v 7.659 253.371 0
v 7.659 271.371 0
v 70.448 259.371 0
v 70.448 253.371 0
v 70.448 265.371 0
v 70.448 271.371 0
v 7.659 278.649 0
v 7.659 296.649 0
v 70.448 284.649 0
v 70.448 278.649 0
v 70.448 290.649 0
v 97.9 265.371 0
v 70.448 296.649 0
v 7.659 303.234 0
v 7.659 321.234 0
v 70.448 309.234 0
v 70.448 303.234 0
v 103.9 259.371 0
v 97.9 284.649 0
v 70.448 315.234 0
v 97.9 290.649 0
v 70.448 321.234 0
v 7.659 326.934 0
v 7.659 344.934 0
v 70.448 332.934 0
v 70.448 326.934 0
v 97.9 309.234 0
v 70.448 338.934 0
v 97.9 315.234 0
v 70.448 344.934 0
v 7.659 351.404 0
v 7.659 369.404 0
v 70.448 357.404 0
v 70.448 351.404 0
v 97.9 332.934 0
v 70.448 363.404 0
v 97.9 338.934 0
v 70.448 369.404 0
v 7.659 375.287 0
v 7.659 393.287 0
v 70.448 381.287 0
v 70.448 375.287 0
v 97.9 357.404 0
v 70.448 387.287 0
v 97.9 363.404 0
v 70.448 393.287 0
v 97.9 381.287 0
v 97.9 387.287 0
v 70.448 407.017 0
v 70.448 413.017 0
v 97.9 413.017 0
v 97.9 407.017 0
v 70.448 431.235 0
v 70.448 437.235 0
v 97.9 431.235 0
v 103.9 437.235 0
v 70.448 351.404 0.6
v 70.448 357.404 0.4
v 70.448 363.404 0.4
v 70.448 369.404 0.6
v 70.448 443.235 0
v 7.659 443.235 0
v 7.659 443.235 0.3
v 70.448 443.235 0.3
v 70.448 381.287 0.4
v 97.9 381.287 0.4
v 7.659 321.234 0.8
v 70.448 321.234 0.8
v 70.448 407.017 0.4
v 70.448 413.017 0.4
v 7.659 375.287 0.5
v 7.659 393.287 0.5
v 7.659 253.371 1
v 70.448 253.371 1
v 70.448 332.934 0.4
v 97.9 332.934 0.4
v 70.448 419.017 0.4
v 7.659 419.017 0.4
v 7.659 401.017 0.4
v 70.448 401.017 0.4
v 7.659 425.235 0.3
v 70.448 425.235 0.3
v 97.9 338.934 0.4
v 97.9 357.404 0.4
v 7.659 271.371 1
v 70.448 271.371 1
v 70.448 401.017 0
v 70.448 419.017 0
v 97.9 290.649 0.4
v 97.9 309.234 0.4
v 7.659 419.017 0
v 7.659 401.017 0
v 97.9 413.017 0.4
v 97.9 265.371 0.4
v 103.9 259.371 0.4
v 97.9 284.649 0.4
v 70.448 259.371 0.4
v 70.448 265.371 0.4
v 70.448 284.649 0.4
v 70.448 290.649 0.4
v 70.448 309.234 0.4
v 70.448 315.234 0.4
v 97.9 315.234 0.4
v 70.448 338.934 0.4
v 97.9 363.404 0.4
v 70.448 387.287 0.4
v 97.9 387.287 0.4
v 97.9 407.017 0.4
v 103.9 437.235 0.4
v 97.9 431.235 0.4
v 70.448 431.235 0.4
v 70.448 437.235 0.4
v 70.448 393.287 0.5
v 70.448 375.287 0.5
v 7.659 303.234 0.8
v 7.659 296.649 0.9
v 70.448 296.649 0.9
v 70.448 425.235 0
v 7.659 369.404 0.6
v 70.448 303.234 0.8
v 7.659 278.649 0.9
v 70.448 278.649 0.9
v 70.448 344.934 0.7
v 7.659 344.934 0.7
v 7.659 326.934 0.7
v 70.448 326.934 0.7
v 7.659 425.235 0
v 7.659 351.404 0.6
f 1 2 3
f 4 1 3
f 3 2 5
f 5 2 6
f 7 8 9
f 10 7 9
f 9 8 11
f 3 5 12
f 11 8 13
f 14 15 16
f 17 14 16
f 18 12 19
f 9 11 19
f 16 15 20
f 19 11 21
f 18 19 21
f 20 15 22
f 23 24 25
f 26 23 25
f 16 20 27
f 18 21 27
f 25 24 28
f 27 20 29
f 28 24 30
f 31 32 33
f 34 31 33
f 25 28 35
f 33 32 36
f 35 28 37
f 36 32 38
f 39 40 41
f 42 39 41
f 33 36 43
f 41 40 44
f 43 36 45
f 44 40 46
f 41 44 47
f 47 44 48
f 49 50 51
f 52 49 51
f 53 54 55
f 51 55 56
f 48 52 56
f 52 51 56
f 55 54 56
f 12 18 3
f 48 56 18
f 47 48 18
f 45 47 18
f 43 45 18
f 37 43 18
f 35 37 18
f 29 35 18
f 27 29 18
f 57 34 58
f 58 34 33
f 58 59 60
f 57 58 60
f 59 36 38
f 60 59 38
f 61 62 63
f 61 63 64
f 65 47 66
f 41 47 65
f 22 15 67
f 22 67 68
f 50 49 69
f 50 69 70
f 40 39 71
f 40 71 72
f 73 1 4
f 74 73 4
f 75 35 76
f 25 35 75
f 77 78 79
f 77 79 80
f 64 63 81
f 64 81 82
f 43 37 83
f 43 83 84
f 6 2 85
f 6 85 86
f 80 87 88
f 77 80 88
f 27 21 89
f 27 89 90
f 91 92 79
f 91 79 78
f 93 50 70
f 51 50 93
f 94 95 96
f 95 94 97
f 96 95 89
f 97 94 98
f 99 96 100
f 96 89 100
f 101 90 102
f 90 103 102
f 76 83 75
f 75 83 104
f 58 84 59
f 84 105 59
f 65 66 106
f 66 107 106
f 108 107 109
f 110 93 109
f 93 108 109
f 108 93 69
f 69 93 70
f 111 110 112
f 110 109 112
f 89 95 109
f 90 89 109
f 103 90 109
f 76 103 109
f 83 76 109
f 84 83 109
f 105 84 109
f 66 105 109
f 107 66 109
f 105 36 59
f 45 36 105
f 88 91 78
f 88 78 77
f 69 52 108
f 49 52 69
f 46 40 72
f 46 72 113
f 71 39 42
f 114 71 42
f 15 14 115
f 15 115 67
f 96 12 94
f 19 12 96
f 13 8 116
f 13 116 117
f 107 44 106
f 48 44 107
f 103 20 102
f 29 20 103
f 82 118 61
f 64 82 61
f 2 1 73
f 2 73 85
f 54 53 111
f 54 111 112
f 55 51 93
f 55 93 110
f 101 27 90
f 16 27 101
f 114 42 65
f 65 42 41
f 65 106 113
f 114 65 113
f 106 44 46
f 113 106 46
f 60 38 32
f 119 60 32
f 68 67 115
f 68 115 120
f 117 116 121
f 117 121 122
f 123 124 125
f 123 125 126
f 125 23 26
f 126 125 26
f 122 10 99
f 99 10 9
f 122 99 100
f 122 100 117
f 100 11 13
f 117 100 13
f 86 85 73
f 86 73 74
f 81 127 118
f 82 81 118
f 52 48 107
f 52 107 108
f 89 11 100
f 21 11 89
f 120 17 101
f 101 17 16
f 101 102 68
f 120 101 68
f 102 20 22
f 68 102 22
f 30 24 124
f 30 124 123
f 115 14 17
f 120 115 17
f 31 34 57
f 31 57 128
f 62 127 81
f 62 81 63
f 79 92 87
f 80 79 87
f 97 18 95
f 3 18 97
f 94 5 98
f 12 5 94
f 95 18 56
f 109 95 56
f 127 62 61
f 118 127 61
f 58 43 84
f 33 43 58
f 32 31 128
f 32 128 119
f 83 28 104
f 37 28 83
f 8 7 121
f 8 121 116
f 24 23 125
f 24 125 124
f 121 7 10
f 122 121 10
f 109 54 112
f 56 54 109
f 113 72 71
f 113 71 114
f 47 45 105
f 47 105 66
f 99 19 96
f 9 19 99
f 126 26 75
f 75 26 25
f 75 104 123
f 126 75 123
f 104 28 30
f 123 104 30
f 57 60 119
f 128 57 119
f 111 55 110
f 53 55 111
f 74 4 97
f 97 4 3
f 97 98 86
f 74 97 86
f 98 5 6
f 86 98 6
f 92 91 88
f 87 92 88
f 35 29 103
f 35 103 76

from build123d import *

# Parameters (mm, degrees)
ESBO_O9_W                = 62.789568093
ESBO_O9_H                = 18
RESSALTO_EXTRUS_O9_DEPTH = 0.3
ESBO_O8_W                = 62.789568093
ESBO_O8_H                = 18
RESSALTO_EXTRUS_O8_DEPTH = 0.4
ESBO_O1_W                = 62.789568093
ESBO_O1_H                = 18
RESSALTO_EXTRUS_O1_DEPTH = 0.5
ESBO_O2_W                = 62.789568093
ESBO_O2_H                = 18
RESSALTO_EXTRUS_O2_DEPTH = 0.6
ESBO_O3_W                = 62.789568093
ESBO_O3_H                = 18
RESSALTO_EXTRUS_O3_DEPTH = 0.7
ESBO_O4_W                = 62.789568093
ESBO_O4_H                = 18
RESSALTO_EXTRUS_O4_DEPTH = 0.8
ESBO_O5_W                = 62.789568093
ESBO_O5_H                = 18
RESSALTO_EXTRUS_O5_DEPTH = 0.9
ESBO_O6_W                = 62.789568093
ESBO_O6_H                = 18
RESSALTO_EXTRUS_O6_DEPTH = 1
RESSALTO_EXTRUS_O7_DEPTH = 0.4


with BuildPart() as part:
    # Esboço9 → Ressalto-extrusão9 (new body)
    with BuildSketch(Plane.XY):
        with Locations((39.053642137, 434.235186495)):
            Rectangle(ESBO_O9_W, ESBO_O9_H)
    extrude(amount=RESSALTO_EXTRUS_O9_DEPTH)


with BuildPart() as body_2:
    # Esboço8 → Ressalto-extrusão8 (new body)
    with BuildSketch(Plane.XY):
        with Locations((39.053642137, 410.017111126)):
            Rectangle(ESBO_O8_W, ESBO_O8_H)
    extrude(amount=RESSALTO_EXTRUS_O8_DEPTH)


with BuildPart() as body_3:
    # Esboço1 → Ressalto-extrusão1 (new body)
    with BuildSketch(Plane.XY):
        with Locations((39.053642137, 384.286764873)):
            Rectangle(ESBO_O1_W, ESBO_O1_H)
    extrude(amount=RESSALTO_EXTRUS_O1_DEPTH)



with BuildPart() as body_4:
    # Esboço2 → Ressalto-extrusão2 (new body)
    with BuildSketch(Plane(origin=(0, 0, 0), x_dir=(-1, 0, 0), z_dir=(0, 0, -1))):
        with Locations((-39.053642137, 360.404184905)):
            Rectangle(ESBO_O2_W, ESBO_O2_H)
    extrude(amount=-RESSALTO_EXTRUS_O2_DEPTH)


with BuildPart() as body_5:
    # Esboço3 → Ressalto-extrusão3 (new body)
    with BuildSketch(Plane.XY):
        with Locations((39.053642137, 335.934065626)):
            Rectangle(ESBO_O3_W, ESBO_O3_H)
    extrude(amount=RESSALTO_EXTRUS_O3_DEPTH)


with BuildPart() as body_6:
    # Esboço4 → Ressalto-extrusão4 (new body)
    with BuildSketch(Plane.XY):
        with Locations((39.053642137, 312.234156495)):
            Rectangle(ESBO_O4_W, ESBO_O4_H)
    extrude(amount=RESSALTO_EXTRUS_O4_DEPTH)


with BuildPart() as body_7:
    # Esboço5 → Ressalto-extrusão5 (new body)
    with BuildSketch(Plane.XY):
        with Locations((39.053642137, 287.648513592)):
            Rectangle(ESBO_O5_W, ESBO_O5_H)
    extrude(amount=RESSALTO_EXTRUS_O5_DEPTH)


with BuildPart() as body_8:
    # Esboço6 → Ressalto-extrusão6 (new body)
    with BuildSketch(Plane.XY):
        with Locations((39.053642137, 262.371419277)):
            Rectangle(ESBO_O6_W, ESBO_O6_H)
    extrude(amount=RESSALTO_EXTRUS_O6_DEPTH)


with BuildPart() as body_3_1:
    add(body_3.part)

    add(body_4.part)  # Ressalto-extrusão7 merges body 4

    add(body_5.part)  # Ressalto-extrusão7 merges body 5

    add(body_6.part)  # Ressalto-extrusão7 merges body 6

    add(body_7.part)  # Ressalto-extrusão7 merges body 7

    add(body_8.part)  # Ressalto-extrusão7 merges body 8
    # Esboço7 → Ressalto-extrusão7 (add)
    with BuildSketch(Plane.XY):
        Polygon((97.899546957, 363.404184905), (97.899546957, 381.286764873), (70.448426183, 381.286764873), (70.448426183, 387.286764873), (97.899546957, 387.286764873), (97.899546957, 407.017111126), (70.448426183, 407.017111126), (70.448426183, 413.017111126), (97.899546957, 413.017111126), (97.899546957, 431.235186495), (70.448426183, 431.235186495), (70.448426183, 437.235186495), (103.899546957, 437.235186495), (103.899546957, 387.286764873), (103.899546957, 259.371419277), (70.448426183, 259.371419277), (70.448426183, 265.371419277), (97.899546957, 265.371419277), (97.899546957, 284.648513592), (70.448426183, 284.648513592), (70.448426183, 290.648513592), (97.899546957, 290.648513592), (97.899546957, 309.234156495), (70.448426183, 309.234156495), (70.448426183, 315.234156495), (97.899546957, 315.234156495), (97.899546957, 332.934065626), (70.448426183, 332.934065626), (70.448426183, 338.934065626), (97.899546957, 338.934065626), (97.899546957, 357.404184905), (70.448426183, 357.404184905), (70.448426183, 363.404184905), align=None)
    extrude(amount=RESSALTO_EXTRUS_O7_DEPTH)


solid = Compound([part.part, body_2.part, body_3_1.part])
